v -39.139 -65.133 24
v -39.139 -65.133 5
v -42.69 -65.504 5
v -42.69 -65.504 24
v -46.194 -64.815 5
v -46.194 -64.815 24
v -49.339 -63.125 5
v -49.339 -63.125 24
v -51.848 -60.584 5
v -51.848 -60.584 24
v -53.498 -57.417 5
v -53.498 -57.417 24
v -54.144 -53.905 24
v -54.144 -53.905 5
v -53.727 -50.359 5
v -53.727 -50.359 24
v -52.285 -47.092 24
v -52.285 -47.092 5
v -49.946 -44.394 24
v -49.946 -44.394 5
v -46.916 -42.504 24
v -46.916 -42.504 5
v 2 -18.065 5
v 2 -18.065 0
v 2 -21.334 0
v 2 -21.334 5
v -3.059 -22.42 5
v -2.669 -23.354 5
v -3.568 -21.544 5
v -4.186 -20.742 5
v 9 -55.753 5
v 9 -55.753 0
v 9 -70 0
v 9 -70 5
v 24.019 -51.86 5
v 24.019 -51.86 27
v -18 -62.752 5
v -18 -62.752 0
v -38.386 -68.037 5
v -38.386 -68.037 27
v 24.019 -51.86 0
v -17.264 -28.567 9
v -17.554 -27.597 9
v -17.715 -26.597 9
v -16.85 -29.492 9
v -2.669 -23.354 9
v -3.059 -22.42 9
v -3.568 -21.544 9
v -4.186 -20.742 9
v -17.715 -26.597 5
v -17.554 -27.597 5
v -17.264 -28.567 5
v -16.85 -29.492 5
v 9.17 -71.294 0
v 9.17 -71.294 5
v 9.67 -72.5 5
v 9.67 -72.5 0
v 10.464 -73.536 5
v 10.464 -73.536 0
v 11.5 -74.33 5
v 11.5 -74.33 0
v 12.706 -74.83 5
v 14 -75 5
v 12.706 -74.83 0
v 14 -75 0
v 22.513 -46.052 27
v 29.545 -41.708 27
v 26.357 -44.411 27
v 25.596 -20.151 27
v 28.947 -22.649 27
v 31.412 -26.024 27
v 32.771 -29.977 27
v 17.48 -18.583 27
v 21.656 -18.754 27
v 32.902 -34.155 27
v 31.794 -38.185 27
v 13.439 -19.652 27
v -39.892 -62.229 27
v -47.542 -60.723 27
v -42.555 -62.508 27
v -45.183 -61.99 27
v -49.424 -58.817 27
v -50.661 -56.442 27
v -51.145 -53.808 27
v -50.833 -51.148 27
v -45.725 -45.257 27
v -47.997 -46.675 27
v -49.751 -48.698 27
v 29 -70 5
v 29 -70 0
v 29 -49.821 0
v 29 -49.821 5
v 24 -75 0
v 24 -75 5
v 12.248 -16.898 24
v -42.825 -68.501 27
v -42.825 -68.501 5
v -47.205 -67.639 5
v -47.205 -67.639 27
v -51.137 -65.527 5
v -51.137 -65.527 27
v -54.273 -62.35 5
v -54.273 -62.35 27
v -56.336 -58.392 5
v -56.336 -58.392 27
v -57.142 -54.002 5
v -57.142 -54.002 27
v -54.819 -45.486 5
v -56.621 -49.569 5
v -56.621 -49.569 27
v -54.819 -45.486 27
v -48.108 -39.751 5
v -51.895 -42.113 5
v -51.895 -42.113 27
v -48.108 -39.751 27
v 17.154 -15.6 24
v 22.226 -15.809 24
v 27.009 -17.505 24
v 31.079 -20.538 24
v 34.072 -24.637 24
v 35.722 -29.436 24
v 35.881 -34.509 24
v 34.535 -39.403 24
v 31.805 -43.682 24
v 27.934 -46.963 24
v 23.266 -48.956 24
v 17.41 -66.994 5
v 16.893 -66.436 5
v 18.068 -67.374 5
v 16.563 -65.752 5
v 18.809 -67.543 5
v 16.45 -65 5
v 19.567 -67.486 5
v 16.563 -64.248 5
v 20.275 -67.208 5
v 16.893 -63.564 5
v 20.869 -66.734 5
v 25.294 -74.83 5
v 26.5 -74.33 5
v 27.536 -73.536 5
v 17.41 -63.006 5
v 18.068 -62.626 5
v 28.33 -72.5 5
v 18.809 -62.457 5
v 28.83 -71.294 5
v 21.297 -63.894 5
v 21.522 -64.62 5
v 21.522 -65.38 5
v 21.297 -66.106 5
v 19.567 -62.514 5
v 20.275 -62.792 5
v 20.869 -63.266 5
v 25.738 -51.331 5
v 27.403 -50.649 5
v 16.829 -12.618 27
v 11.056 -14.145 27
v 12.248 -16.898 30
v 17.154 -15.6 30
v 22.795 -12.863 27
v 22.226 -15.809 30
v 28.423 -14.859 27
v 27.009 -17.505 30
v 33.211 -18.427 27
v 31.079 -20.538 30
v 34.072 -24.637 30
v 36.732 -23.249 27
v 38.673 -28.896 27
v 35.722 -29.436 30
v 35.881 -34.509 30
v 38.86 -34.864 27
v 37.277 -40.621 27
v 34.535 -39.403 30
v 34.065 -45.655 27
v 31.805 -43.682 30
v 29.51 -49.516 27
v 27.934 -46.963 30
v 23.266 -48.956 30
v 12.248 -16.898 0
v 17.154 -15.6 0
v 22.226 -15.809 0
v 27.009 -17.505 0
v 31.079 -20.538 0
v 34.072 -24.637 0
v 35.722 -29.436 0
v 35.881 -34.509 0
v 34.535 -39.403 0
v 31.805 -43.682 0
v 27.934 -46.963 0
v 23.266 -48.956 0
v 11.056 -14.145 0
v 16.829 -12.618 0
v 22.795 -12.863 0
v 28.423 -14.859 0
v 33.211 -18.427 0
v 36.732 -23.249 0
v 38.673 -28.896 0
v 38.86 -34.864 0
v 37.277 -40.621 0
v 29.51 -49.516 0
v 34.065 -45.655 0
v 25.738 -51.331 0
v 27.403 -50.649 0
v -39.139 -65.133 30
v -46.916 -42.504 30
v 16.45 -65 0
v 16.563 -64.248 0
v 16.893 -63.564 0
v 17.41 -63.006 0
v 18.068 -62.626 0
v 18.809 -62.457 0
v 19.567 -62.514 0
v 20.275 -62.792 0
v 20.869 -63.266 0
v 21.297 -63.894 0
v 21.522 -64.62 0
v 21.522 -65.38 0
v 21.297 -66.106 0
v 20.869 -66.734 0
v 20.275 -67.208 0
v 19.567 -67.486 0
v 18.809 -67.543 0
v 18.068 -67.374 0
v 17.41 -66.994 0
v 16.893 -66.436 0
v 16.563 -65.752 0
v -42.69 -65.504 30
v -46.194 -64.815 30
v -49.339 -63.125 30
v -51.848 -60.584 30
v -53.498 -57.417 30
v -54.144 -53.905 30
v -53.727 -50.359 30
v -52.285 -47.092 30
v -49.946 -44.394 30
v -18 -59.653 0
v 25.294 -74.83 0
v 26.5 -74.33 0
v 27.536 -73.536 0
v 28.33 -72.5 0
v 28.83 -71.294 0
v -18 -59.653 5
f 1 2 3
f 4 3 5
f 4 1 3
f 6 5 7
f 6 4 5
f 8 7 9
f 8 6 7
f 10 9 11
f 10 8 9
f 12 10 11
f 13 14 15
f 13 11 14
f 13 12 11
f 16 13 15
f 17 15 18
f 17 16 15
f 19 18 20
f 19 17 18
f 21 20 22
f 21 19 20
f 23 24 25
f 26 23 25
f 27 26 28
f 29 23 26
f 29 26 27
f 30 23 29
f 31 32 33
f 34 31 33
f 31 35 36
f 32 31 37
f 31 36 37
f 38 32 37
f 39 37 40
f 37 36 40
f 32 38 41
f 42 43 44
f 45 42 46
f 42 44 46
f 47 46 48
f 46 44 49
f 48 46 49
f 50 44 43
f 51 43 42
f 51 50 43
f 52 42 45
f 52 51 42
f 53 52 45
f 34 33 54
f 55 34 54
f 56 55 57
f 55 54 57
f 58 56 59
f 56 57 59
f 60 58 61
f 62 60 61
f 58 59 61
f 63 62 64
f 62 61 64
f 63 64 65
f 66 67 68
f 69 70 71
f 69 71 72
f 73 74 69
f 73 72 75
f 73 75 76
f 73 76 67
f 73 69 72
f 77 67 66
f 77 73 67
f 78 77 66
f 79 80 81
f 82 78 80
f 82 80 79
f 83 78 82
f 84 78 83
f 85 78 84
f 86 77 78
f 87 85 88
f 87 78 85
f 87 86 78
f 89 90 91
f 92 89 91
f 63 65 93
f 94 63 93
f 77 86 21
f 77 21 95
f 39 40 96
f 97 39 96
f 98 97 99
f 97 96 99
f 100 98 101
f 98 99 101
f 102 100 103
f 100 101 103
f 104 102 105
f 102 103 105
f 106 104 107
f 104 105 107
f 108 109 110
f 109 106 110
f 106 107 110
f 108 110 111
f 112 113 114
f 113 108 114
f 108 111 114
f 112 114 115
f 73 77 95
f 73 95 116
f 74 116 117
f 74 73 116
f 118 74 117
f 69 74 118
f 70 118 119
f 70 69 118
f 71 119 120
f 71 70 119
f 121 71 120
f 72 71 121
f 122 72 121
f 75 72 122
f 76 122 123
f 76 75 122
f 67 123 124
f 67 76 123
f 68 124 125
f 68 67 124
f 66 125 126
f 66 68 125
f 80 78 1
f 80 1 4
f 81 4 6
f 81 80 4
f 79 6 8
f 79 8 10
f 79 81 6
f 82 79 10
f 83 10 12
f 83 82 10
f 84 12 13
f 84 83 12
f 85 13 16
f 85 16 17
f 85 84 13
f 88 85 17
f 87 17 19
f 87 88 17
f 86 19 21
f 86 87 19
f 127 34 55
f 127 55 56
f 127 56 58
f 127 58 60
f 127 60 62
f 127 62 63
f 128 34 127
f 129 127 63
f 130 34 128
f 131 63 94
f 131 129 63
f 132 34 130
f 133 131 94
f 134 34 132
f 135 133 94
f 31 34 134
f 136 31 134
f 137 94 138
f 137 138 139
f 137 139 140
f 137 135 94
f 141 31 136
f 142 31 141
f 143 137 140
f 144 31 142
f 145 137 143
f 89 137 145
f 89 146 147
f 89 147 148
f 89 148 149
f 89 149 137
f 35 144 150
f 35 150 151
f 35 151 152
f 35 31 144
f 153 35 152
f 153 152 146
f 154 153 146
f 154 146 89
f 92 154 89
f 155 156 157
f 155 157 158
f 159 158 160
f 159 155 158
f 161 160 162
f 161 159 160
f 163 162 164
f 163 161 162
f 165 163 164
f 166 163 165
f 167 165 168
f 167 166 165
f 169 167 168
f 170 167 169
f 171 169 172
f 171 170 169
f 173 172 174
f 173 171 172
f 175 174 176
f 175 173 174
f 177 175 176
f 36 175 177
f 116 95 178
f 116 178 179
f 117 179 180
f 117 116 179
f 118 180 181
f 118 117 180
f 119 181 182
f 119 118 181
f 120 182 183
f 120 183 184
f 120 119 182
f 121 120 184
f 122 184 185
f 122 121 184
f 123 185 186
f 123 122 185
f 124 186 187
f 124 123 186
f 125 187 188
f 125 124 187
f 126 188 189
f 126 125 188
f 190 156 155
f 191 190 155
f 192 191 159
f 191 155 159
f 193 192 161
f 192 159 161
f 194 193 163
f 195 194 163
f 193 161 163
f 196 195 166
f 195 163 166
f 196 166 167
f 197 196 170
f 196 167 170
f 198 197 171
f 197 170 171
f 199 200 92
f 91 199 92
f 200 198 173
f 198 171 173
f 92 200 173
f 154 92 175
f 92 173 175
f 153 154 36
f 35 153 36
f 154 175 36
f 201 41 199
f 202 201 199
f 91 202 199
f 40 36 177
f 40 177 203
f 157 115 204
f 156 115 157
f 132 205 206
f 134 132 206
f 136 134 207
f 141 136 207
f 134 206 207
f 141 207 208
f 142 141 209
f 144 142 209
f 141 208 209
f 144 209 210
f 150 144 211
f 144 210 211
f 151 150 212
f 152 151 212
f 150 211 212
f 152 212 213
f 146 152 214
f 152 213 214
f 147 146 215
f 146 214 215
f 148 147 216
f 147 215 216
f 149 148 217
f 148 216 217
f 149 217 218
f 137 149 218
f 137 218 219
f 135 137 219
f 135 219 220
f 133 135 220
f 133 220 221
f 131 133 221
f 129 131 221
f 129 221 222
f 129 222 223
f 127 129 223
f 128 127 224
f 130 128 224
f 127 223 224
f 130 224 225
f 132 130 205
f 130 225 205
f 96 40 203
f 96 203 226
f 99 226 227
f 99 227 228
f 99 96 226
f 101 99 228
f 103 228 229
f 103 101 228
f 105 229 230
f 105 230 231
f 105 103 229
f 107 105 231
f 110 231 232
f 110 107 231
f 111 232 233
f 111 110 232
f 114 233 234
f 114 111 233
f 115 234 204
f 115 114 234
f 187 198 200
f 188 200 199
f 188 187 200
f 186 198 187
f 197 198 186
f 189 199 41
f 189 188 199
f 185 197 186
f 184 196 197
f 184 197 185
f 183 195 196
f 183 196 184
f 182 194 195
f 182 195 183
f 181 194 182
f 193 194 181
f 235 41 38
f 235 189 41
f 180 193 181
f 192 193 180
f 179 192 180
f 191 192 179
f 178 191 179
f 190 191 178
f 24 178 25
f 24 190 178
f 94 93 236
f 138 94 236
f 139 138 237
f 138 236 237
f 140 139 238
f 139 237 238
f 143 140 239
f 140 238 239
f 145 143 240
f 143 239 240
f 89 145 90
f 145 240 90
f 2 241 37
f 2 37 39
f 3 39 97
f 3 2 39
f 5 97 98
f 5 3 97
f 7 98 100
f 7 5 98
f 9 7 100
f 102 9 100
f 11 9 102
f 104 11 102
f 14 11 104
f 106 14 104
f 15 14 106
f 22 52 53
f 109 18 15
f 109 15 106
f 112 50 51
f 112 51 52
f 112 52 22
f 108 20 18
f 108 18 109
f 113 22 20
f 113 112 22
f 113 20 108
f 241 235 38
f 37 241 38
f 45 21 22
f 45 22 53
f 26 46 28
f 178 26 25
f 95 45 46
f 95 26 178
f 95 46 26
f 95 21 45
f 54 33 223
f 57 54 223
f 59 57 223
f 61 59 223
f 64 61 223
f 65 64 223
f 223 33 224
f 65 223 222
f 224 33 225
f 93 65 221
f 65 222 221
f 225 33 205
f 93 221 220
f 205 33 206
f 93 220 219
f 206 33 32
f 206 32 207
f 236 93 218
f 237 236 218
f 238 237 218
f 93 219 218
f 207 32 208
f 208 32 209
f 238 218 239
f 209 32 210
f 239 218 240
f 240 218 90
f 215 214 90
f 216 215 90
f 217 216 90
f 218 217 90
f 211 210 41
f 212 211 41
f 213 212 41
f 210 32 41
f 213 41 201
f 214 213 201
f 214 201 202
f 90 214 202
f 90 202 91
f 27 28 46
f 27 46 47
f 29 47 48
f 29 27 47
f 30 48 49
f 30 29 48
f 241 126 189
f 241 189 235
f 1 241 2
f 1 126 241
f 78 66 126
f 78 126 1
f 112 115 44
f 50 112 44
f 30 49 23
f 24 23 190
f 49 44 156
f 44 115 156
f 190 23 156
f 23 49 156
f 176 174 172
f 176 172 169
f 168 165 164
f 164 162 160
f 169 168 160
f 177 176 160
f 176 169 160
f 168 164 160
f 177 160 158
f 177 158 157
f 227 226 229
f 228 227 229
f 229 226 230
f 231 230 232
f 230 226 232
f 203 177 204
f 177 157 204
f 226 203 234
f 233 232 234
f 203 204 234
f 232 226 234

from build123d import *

# Parameters (mm, degrees)
BOSS_EXTRUDE1_DEPTH = 3
BOSS_EXTRUDE2_DEPTH = 26.999994
CHAMFER1_SIZE       = 3
CUT_EXTRUDE1_DEPTH  = 4.999994
SKETCH4_3_R         = 7.75
CUT_EXTRUDE2_DEPTH  = 4
SKETCH7_R           = 2.55
BOSS_EXTRUDE5_DEPTH = 5


with BuildPart() as part:
    # Sketch2 → Boss-Extrude1 (new body)
    with BuildSketch(Plane.XY.offset(26.999993563)):
        with BuildLine():
            Line((-48.107762328, -39.75057759), (11.056310458, -14.145221365))
            ThreePointArc((11.056310458, -14.145221365), (37.914072471, -25.999413947), (24.018554683, -51.86011478))
            Line((24.018554683, -51.86011478), (-38.38607916, -68.036747651))
            ThreePointArc((-38.38607916, -68.036747651), (-56.335559182, -58.392101106), (-48.107762328, -39.75057759))
        make_face()
    extrude(amount=BOSS_EXTRUDE1_DEPTH)

    # Sketch3 → Boss-Extrude2 (add)
    with BuildSketch(Plane(origin=(0, 0, 26.999993563), x_dir=(-1, 0, 0), z_dir=(0, 0, -1))):
        with BuildLine():
            Line((48.107762328, -39.75057759), (-11.056310458, -14.145221365))
            ThreePointArc((-11.056310458, -14.145221365), (-37.914072471, -25.999413947), (-24.018554683, -51.86011478))
            Line((-24.018554683, -51.86011478), (38.38607916, -68.036747651))
            ThreePointArc((38.38607916, -68.036747651), (56.335559182, -58.392101106), (48.107762328, -39.75057759))
        make_face()
        with BuildLine():
            Line((46.916209863, -42.503794385), (-12.247862924, -16.89843816))
            ThreePointArc((-12.247862924, -16.89843816), (-35.076960635, -26.974501855), (-23.265770515, -48.956097563))
            Line((-23.265770515, -48.956097563), (39.138863328, -65.132730434))
            ThreePointArc((39.138863328, -65.132730434), (53.498447346, -57.417013198), (46.916209863, -42.503794385))
        make_face(mode=Mode.SUBTRACT)
    extrude(amount=BOSS_EXTRUDE2_DEPTH)

    # Chamfer1
    chamfer1_edges = [part.edges().sort_by_distance(p)[0] for p in [
        (37.914072471, -25.999413947, 29.999993563),
        (-18.525725935, -26.947899478, 29.999993563),
        (-53.498447346, -57.417013198, 26.999993563),
        (-17.334173469, -29.701116273, 26.999993563),
        (35.076960635, -26.974501855, 26.999993563),
        (-7.936546407, -57.044413998, 26.999993563),
        (-56.335559182, -58.392101106, 29.999993563),
        (-7.183762238, -59.948431215, 29.999993563),
    ]]
    chamfer(chamfer1_edges, length=CHAMFER1_SIZE)

    # Sketch4 → Cut-Extrude1 (cut)
    with BuildSketch(Plane.XY.offset(4.999993563)):
        Polygon((-63.676072098, -10.5), (2, -10.5), (2, -39.366661566), (-18, -39.366661566), (-18, -71.666661566), (-63.676072098, -71.666661566), align=None)
    extrude(amount=-CUT_EXTRUDE1_DEPTH, mode=Mode.SUBTRACT)

    # Sketch4<3> → Cut-Extrude2 (cut)
    with BuildSketch(Plane.XY.offset(4.999993563)):
        with Locations((-10, -25.866661566)):
            Circle(SKETCH4_3_R)
    extrude(amount=CUT_EXTRUDE2_DEPTH, mode=Mode.SUBTRACT)

    # Sketch7 → Boss-Extrude5 (add)
    with BuildSketch(Plane(origin=(0, 0, 0), x_dir=(-1, 0, 0), z_dir=(0, 0, -1))):
        with BuildLine():
            Line((-8.999993562, -55.753251147), (-8.999993562, -70))
            ThreePointArc((-8.999993562, -70), (-10.464459657, -73.535533906), (-13.999993562, -75))
            Line((-13.999993562, -75), (-23.999993562, -75))
            ThreePointArc((-23.999993562, -75), (-27.535527468, -73.535533906), (-28.999993562, -70))
            Line((-28.999993562, -70), (-28.999993562, -49.820508076))
            ThreePointArc((-28.999993562, -49.820508076), (-26.578205318, -51.008665716), (-24.018554683, -51.86011478))
            Line((-24.018554683, -51.86011478), (-8.999993562, -55.753251147))
        make_face()
        with Locations((-18.999993562, -65)):
            Circle(SKETCH7_R, mode=Mode.SUBTRACT)
    extrude(amount=-BOSS_EXTRUDE5_DEPTH)


solid = part.part
